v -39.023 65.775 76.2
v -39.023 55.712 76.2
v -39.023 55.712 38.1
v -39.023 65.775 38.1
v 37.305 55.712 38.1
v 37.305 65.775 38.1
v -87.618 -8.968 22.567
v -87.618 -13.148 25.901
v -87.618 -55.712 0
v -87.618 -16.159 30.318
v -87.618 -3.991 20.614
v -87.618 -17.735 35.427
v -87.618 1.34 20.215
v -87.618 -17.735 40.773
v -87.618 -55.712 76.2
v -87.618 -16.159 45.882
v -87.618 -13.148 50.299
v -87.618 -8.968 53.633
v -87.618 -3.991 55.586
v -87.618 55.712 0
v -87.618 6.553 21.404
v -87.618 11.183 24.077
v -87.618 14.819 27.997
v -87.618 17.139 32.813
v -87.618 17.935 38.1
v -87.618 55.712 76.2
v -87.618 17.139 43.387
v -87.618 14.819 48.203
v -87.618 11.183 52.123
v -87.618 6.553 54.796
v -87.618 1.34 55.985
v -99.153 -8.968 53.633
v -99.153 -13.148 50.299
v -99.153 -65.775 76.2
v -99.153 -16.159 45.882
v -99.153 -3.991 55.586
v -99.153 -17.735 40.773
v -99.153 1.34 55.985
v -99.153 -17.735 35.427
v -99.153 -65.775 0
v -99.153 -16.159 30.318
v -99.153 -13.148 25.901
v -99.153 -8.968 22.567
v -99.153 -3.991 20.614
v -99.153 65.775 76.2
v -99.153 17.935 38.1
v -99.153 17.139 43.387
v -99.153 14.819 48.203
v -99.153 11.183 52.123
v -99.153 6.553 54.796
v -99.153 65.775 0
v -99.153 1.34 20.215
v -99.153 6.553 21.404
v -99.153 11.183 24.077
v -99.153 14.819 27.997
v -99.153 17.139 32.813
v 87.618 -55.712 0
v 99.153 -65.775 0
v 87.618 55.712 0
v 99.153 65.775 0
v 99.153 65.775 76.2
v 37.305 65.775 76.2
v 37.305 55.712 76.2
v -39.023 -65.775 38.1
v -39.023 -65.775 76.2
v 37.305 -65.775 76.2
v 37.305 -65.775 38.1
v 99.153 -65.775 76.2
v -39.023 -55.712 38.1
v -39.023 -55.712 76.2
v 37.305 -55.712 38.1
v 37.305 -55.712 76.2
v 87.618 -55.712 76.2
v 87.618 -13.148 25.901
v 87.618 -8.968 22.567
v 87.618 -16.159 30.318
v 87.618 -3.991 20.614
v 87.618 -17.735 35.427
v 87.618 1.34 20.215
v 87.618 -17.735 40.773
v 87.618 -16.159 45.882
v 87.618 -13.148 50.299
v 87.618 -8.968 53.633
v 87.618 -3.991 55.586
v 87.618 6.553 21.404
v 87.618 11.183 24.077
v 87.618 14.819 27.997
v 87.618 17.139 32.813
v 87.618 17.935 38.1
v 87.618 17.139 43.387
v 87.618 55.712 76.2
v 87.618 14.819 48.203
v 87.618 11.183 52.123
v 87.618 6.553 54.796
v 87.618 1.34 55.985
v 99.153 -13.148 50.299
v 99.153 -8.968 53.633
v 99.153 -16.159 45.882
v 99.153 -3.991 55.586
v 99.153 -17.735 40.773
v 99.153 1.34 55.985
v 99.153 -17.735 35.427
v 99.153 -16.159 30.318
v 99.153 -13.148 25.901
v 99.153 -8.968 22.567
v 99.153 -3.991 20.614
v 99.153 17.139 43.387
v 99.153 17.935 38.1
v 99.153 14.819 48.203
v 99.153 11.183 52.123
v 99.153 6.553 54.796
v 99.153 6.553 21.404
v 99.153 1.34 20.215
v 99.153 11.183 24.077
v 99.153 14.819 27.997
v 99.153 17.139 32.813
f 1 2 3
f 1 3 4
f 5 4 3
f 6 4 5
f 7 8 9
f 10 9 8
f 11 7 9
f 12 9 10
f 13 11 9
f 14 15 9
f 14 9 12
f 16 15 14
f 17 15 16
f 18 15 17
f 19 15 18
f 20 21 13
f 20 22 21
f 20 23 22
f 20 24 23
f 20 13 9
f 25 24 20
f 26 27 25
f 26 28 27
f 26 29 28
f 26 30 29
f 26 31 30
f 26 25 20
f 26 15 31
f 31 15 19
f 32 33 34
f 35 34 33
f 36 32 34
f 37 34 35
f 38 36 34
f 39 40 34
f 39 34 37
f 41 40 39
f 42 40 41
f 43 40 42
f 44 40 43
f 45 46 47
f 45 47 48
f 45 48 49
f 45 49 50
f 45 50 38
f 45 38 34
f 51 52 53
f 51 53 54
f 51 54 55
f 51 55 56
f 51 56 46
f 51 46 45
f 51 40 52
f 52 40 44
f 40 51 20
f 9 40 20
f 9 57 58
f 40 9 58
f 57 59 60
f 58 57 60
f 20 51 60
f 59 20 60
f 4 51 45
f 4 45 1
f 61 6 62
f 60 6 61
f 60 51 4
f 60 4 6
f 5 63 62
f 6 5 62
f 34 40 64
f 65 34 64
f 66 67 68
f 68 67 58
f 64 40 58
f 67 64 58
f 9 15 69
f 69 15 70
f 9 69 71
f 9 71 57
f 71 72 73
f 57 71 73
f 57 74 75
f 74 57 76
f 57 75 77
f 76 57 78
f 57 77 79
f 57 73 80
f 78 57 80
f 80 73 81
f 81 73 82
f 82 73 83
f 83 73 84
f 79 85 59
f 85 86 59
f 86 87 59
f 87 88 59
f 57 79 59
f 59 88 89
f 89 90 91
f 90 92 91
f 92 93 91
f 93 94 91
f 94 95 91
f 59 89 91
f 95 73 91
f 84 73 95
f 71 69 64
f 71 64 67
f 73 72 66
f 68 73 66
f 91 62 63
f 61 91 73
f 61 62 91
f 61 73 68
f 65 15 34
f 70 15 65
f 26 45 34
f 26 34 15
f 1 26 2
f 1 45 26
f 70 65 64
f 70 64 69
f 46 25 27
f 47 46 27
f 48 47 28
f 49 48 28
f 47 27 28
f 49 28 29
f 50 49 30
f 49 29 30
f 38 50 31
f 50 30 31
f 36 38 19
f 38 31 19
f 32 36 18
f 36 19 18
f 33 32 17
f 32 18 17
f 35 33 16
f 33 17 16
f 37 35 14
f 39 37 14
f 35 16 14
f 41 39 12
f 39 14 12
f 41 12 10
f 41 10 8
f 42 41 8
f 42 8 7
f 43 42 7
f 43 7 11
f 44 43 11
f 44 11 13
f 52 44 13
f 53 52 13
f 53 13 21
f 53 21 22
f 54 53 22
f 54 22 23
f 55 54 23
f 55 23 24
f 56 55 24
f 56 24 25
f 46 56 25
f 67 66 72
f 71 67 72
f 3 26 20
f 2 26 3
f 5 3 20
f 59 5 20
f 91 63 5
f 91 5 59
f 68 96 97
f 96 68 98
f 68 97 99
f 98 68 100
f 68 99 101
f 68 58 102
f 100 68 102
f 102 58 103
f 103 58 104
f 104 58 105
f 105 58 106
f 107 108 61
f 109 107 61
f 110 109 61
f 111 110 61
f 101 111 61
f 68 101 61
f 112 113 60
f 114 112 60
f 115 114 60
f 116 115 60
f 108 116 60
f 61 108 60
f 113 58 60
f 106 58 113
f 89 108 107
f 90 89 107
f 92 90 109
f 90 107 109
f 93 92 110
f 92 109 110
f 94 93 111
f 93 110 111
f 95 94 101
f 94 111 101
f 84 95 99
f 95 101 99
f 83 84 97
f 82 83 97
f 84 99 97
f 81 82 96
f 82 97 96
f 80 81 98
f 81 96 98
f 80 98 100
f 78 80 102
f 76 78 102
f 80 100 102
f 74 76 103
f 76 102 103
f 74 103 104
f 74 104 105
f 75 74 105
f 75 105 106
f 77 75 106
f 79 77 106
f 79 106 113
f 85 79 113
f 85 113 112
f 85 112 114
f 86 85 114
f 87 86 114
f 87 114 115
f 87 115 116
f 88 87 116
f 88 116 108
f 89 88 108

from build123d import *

# Parameters (mm, degrees)
F0_W     = 198.306992
F0_H     = 131.550192
F1_DEPTH = 76.2
F2_W     = 175.236628
F2_H     = 111.424976
F3_DEPTH = 76.201
F4_R     = 17.935486
F5_DEPTH = 198.307993
F6_W     = 76.328561
F6_H     = 10.062608
F7_DEPTH = 38.1


with BuildPart() as f1:
    # F0 (on Top) → F1 (new body)
    with BuildSketch(Plane.XY):
        Rectangle(F0_W, F0_H)
    extrude(amount=F1_DEPTH)

    # F2 (on face) → F3 (cut, through all)
    with BuildSketch(Plane.XY.offset(76.2)):
        Rectangle(F2_W, F2_H)
    extrude(amount=-F3_DEPTH, mode=Mode.SUBTRACT)

    # F4 (on face) → F5 (cut, through all)
    with BuildSketch(Plane.YZ.offset(99.153496)):
        with Locations((0, 38.1)):
            Circle(F4_R)
    extrude(amount=-F5_DEPTH, mode=Mode.SUBTRACT)

    # F6 (on face) → F7 (cut)
    with BuildSketch(Plane.XY.offset(76.2)):
        with Locations((-0.859004, 60.743792)):
            Rectangle(F6_W, F6_H)
        with Locations((-0.859004, -60.743792)):
            Rectangle(F6_W, F6_H)
    extrude(amount=-F7_DEPTH, mode=Mode.SUBTRACT)


solid = f1.part
